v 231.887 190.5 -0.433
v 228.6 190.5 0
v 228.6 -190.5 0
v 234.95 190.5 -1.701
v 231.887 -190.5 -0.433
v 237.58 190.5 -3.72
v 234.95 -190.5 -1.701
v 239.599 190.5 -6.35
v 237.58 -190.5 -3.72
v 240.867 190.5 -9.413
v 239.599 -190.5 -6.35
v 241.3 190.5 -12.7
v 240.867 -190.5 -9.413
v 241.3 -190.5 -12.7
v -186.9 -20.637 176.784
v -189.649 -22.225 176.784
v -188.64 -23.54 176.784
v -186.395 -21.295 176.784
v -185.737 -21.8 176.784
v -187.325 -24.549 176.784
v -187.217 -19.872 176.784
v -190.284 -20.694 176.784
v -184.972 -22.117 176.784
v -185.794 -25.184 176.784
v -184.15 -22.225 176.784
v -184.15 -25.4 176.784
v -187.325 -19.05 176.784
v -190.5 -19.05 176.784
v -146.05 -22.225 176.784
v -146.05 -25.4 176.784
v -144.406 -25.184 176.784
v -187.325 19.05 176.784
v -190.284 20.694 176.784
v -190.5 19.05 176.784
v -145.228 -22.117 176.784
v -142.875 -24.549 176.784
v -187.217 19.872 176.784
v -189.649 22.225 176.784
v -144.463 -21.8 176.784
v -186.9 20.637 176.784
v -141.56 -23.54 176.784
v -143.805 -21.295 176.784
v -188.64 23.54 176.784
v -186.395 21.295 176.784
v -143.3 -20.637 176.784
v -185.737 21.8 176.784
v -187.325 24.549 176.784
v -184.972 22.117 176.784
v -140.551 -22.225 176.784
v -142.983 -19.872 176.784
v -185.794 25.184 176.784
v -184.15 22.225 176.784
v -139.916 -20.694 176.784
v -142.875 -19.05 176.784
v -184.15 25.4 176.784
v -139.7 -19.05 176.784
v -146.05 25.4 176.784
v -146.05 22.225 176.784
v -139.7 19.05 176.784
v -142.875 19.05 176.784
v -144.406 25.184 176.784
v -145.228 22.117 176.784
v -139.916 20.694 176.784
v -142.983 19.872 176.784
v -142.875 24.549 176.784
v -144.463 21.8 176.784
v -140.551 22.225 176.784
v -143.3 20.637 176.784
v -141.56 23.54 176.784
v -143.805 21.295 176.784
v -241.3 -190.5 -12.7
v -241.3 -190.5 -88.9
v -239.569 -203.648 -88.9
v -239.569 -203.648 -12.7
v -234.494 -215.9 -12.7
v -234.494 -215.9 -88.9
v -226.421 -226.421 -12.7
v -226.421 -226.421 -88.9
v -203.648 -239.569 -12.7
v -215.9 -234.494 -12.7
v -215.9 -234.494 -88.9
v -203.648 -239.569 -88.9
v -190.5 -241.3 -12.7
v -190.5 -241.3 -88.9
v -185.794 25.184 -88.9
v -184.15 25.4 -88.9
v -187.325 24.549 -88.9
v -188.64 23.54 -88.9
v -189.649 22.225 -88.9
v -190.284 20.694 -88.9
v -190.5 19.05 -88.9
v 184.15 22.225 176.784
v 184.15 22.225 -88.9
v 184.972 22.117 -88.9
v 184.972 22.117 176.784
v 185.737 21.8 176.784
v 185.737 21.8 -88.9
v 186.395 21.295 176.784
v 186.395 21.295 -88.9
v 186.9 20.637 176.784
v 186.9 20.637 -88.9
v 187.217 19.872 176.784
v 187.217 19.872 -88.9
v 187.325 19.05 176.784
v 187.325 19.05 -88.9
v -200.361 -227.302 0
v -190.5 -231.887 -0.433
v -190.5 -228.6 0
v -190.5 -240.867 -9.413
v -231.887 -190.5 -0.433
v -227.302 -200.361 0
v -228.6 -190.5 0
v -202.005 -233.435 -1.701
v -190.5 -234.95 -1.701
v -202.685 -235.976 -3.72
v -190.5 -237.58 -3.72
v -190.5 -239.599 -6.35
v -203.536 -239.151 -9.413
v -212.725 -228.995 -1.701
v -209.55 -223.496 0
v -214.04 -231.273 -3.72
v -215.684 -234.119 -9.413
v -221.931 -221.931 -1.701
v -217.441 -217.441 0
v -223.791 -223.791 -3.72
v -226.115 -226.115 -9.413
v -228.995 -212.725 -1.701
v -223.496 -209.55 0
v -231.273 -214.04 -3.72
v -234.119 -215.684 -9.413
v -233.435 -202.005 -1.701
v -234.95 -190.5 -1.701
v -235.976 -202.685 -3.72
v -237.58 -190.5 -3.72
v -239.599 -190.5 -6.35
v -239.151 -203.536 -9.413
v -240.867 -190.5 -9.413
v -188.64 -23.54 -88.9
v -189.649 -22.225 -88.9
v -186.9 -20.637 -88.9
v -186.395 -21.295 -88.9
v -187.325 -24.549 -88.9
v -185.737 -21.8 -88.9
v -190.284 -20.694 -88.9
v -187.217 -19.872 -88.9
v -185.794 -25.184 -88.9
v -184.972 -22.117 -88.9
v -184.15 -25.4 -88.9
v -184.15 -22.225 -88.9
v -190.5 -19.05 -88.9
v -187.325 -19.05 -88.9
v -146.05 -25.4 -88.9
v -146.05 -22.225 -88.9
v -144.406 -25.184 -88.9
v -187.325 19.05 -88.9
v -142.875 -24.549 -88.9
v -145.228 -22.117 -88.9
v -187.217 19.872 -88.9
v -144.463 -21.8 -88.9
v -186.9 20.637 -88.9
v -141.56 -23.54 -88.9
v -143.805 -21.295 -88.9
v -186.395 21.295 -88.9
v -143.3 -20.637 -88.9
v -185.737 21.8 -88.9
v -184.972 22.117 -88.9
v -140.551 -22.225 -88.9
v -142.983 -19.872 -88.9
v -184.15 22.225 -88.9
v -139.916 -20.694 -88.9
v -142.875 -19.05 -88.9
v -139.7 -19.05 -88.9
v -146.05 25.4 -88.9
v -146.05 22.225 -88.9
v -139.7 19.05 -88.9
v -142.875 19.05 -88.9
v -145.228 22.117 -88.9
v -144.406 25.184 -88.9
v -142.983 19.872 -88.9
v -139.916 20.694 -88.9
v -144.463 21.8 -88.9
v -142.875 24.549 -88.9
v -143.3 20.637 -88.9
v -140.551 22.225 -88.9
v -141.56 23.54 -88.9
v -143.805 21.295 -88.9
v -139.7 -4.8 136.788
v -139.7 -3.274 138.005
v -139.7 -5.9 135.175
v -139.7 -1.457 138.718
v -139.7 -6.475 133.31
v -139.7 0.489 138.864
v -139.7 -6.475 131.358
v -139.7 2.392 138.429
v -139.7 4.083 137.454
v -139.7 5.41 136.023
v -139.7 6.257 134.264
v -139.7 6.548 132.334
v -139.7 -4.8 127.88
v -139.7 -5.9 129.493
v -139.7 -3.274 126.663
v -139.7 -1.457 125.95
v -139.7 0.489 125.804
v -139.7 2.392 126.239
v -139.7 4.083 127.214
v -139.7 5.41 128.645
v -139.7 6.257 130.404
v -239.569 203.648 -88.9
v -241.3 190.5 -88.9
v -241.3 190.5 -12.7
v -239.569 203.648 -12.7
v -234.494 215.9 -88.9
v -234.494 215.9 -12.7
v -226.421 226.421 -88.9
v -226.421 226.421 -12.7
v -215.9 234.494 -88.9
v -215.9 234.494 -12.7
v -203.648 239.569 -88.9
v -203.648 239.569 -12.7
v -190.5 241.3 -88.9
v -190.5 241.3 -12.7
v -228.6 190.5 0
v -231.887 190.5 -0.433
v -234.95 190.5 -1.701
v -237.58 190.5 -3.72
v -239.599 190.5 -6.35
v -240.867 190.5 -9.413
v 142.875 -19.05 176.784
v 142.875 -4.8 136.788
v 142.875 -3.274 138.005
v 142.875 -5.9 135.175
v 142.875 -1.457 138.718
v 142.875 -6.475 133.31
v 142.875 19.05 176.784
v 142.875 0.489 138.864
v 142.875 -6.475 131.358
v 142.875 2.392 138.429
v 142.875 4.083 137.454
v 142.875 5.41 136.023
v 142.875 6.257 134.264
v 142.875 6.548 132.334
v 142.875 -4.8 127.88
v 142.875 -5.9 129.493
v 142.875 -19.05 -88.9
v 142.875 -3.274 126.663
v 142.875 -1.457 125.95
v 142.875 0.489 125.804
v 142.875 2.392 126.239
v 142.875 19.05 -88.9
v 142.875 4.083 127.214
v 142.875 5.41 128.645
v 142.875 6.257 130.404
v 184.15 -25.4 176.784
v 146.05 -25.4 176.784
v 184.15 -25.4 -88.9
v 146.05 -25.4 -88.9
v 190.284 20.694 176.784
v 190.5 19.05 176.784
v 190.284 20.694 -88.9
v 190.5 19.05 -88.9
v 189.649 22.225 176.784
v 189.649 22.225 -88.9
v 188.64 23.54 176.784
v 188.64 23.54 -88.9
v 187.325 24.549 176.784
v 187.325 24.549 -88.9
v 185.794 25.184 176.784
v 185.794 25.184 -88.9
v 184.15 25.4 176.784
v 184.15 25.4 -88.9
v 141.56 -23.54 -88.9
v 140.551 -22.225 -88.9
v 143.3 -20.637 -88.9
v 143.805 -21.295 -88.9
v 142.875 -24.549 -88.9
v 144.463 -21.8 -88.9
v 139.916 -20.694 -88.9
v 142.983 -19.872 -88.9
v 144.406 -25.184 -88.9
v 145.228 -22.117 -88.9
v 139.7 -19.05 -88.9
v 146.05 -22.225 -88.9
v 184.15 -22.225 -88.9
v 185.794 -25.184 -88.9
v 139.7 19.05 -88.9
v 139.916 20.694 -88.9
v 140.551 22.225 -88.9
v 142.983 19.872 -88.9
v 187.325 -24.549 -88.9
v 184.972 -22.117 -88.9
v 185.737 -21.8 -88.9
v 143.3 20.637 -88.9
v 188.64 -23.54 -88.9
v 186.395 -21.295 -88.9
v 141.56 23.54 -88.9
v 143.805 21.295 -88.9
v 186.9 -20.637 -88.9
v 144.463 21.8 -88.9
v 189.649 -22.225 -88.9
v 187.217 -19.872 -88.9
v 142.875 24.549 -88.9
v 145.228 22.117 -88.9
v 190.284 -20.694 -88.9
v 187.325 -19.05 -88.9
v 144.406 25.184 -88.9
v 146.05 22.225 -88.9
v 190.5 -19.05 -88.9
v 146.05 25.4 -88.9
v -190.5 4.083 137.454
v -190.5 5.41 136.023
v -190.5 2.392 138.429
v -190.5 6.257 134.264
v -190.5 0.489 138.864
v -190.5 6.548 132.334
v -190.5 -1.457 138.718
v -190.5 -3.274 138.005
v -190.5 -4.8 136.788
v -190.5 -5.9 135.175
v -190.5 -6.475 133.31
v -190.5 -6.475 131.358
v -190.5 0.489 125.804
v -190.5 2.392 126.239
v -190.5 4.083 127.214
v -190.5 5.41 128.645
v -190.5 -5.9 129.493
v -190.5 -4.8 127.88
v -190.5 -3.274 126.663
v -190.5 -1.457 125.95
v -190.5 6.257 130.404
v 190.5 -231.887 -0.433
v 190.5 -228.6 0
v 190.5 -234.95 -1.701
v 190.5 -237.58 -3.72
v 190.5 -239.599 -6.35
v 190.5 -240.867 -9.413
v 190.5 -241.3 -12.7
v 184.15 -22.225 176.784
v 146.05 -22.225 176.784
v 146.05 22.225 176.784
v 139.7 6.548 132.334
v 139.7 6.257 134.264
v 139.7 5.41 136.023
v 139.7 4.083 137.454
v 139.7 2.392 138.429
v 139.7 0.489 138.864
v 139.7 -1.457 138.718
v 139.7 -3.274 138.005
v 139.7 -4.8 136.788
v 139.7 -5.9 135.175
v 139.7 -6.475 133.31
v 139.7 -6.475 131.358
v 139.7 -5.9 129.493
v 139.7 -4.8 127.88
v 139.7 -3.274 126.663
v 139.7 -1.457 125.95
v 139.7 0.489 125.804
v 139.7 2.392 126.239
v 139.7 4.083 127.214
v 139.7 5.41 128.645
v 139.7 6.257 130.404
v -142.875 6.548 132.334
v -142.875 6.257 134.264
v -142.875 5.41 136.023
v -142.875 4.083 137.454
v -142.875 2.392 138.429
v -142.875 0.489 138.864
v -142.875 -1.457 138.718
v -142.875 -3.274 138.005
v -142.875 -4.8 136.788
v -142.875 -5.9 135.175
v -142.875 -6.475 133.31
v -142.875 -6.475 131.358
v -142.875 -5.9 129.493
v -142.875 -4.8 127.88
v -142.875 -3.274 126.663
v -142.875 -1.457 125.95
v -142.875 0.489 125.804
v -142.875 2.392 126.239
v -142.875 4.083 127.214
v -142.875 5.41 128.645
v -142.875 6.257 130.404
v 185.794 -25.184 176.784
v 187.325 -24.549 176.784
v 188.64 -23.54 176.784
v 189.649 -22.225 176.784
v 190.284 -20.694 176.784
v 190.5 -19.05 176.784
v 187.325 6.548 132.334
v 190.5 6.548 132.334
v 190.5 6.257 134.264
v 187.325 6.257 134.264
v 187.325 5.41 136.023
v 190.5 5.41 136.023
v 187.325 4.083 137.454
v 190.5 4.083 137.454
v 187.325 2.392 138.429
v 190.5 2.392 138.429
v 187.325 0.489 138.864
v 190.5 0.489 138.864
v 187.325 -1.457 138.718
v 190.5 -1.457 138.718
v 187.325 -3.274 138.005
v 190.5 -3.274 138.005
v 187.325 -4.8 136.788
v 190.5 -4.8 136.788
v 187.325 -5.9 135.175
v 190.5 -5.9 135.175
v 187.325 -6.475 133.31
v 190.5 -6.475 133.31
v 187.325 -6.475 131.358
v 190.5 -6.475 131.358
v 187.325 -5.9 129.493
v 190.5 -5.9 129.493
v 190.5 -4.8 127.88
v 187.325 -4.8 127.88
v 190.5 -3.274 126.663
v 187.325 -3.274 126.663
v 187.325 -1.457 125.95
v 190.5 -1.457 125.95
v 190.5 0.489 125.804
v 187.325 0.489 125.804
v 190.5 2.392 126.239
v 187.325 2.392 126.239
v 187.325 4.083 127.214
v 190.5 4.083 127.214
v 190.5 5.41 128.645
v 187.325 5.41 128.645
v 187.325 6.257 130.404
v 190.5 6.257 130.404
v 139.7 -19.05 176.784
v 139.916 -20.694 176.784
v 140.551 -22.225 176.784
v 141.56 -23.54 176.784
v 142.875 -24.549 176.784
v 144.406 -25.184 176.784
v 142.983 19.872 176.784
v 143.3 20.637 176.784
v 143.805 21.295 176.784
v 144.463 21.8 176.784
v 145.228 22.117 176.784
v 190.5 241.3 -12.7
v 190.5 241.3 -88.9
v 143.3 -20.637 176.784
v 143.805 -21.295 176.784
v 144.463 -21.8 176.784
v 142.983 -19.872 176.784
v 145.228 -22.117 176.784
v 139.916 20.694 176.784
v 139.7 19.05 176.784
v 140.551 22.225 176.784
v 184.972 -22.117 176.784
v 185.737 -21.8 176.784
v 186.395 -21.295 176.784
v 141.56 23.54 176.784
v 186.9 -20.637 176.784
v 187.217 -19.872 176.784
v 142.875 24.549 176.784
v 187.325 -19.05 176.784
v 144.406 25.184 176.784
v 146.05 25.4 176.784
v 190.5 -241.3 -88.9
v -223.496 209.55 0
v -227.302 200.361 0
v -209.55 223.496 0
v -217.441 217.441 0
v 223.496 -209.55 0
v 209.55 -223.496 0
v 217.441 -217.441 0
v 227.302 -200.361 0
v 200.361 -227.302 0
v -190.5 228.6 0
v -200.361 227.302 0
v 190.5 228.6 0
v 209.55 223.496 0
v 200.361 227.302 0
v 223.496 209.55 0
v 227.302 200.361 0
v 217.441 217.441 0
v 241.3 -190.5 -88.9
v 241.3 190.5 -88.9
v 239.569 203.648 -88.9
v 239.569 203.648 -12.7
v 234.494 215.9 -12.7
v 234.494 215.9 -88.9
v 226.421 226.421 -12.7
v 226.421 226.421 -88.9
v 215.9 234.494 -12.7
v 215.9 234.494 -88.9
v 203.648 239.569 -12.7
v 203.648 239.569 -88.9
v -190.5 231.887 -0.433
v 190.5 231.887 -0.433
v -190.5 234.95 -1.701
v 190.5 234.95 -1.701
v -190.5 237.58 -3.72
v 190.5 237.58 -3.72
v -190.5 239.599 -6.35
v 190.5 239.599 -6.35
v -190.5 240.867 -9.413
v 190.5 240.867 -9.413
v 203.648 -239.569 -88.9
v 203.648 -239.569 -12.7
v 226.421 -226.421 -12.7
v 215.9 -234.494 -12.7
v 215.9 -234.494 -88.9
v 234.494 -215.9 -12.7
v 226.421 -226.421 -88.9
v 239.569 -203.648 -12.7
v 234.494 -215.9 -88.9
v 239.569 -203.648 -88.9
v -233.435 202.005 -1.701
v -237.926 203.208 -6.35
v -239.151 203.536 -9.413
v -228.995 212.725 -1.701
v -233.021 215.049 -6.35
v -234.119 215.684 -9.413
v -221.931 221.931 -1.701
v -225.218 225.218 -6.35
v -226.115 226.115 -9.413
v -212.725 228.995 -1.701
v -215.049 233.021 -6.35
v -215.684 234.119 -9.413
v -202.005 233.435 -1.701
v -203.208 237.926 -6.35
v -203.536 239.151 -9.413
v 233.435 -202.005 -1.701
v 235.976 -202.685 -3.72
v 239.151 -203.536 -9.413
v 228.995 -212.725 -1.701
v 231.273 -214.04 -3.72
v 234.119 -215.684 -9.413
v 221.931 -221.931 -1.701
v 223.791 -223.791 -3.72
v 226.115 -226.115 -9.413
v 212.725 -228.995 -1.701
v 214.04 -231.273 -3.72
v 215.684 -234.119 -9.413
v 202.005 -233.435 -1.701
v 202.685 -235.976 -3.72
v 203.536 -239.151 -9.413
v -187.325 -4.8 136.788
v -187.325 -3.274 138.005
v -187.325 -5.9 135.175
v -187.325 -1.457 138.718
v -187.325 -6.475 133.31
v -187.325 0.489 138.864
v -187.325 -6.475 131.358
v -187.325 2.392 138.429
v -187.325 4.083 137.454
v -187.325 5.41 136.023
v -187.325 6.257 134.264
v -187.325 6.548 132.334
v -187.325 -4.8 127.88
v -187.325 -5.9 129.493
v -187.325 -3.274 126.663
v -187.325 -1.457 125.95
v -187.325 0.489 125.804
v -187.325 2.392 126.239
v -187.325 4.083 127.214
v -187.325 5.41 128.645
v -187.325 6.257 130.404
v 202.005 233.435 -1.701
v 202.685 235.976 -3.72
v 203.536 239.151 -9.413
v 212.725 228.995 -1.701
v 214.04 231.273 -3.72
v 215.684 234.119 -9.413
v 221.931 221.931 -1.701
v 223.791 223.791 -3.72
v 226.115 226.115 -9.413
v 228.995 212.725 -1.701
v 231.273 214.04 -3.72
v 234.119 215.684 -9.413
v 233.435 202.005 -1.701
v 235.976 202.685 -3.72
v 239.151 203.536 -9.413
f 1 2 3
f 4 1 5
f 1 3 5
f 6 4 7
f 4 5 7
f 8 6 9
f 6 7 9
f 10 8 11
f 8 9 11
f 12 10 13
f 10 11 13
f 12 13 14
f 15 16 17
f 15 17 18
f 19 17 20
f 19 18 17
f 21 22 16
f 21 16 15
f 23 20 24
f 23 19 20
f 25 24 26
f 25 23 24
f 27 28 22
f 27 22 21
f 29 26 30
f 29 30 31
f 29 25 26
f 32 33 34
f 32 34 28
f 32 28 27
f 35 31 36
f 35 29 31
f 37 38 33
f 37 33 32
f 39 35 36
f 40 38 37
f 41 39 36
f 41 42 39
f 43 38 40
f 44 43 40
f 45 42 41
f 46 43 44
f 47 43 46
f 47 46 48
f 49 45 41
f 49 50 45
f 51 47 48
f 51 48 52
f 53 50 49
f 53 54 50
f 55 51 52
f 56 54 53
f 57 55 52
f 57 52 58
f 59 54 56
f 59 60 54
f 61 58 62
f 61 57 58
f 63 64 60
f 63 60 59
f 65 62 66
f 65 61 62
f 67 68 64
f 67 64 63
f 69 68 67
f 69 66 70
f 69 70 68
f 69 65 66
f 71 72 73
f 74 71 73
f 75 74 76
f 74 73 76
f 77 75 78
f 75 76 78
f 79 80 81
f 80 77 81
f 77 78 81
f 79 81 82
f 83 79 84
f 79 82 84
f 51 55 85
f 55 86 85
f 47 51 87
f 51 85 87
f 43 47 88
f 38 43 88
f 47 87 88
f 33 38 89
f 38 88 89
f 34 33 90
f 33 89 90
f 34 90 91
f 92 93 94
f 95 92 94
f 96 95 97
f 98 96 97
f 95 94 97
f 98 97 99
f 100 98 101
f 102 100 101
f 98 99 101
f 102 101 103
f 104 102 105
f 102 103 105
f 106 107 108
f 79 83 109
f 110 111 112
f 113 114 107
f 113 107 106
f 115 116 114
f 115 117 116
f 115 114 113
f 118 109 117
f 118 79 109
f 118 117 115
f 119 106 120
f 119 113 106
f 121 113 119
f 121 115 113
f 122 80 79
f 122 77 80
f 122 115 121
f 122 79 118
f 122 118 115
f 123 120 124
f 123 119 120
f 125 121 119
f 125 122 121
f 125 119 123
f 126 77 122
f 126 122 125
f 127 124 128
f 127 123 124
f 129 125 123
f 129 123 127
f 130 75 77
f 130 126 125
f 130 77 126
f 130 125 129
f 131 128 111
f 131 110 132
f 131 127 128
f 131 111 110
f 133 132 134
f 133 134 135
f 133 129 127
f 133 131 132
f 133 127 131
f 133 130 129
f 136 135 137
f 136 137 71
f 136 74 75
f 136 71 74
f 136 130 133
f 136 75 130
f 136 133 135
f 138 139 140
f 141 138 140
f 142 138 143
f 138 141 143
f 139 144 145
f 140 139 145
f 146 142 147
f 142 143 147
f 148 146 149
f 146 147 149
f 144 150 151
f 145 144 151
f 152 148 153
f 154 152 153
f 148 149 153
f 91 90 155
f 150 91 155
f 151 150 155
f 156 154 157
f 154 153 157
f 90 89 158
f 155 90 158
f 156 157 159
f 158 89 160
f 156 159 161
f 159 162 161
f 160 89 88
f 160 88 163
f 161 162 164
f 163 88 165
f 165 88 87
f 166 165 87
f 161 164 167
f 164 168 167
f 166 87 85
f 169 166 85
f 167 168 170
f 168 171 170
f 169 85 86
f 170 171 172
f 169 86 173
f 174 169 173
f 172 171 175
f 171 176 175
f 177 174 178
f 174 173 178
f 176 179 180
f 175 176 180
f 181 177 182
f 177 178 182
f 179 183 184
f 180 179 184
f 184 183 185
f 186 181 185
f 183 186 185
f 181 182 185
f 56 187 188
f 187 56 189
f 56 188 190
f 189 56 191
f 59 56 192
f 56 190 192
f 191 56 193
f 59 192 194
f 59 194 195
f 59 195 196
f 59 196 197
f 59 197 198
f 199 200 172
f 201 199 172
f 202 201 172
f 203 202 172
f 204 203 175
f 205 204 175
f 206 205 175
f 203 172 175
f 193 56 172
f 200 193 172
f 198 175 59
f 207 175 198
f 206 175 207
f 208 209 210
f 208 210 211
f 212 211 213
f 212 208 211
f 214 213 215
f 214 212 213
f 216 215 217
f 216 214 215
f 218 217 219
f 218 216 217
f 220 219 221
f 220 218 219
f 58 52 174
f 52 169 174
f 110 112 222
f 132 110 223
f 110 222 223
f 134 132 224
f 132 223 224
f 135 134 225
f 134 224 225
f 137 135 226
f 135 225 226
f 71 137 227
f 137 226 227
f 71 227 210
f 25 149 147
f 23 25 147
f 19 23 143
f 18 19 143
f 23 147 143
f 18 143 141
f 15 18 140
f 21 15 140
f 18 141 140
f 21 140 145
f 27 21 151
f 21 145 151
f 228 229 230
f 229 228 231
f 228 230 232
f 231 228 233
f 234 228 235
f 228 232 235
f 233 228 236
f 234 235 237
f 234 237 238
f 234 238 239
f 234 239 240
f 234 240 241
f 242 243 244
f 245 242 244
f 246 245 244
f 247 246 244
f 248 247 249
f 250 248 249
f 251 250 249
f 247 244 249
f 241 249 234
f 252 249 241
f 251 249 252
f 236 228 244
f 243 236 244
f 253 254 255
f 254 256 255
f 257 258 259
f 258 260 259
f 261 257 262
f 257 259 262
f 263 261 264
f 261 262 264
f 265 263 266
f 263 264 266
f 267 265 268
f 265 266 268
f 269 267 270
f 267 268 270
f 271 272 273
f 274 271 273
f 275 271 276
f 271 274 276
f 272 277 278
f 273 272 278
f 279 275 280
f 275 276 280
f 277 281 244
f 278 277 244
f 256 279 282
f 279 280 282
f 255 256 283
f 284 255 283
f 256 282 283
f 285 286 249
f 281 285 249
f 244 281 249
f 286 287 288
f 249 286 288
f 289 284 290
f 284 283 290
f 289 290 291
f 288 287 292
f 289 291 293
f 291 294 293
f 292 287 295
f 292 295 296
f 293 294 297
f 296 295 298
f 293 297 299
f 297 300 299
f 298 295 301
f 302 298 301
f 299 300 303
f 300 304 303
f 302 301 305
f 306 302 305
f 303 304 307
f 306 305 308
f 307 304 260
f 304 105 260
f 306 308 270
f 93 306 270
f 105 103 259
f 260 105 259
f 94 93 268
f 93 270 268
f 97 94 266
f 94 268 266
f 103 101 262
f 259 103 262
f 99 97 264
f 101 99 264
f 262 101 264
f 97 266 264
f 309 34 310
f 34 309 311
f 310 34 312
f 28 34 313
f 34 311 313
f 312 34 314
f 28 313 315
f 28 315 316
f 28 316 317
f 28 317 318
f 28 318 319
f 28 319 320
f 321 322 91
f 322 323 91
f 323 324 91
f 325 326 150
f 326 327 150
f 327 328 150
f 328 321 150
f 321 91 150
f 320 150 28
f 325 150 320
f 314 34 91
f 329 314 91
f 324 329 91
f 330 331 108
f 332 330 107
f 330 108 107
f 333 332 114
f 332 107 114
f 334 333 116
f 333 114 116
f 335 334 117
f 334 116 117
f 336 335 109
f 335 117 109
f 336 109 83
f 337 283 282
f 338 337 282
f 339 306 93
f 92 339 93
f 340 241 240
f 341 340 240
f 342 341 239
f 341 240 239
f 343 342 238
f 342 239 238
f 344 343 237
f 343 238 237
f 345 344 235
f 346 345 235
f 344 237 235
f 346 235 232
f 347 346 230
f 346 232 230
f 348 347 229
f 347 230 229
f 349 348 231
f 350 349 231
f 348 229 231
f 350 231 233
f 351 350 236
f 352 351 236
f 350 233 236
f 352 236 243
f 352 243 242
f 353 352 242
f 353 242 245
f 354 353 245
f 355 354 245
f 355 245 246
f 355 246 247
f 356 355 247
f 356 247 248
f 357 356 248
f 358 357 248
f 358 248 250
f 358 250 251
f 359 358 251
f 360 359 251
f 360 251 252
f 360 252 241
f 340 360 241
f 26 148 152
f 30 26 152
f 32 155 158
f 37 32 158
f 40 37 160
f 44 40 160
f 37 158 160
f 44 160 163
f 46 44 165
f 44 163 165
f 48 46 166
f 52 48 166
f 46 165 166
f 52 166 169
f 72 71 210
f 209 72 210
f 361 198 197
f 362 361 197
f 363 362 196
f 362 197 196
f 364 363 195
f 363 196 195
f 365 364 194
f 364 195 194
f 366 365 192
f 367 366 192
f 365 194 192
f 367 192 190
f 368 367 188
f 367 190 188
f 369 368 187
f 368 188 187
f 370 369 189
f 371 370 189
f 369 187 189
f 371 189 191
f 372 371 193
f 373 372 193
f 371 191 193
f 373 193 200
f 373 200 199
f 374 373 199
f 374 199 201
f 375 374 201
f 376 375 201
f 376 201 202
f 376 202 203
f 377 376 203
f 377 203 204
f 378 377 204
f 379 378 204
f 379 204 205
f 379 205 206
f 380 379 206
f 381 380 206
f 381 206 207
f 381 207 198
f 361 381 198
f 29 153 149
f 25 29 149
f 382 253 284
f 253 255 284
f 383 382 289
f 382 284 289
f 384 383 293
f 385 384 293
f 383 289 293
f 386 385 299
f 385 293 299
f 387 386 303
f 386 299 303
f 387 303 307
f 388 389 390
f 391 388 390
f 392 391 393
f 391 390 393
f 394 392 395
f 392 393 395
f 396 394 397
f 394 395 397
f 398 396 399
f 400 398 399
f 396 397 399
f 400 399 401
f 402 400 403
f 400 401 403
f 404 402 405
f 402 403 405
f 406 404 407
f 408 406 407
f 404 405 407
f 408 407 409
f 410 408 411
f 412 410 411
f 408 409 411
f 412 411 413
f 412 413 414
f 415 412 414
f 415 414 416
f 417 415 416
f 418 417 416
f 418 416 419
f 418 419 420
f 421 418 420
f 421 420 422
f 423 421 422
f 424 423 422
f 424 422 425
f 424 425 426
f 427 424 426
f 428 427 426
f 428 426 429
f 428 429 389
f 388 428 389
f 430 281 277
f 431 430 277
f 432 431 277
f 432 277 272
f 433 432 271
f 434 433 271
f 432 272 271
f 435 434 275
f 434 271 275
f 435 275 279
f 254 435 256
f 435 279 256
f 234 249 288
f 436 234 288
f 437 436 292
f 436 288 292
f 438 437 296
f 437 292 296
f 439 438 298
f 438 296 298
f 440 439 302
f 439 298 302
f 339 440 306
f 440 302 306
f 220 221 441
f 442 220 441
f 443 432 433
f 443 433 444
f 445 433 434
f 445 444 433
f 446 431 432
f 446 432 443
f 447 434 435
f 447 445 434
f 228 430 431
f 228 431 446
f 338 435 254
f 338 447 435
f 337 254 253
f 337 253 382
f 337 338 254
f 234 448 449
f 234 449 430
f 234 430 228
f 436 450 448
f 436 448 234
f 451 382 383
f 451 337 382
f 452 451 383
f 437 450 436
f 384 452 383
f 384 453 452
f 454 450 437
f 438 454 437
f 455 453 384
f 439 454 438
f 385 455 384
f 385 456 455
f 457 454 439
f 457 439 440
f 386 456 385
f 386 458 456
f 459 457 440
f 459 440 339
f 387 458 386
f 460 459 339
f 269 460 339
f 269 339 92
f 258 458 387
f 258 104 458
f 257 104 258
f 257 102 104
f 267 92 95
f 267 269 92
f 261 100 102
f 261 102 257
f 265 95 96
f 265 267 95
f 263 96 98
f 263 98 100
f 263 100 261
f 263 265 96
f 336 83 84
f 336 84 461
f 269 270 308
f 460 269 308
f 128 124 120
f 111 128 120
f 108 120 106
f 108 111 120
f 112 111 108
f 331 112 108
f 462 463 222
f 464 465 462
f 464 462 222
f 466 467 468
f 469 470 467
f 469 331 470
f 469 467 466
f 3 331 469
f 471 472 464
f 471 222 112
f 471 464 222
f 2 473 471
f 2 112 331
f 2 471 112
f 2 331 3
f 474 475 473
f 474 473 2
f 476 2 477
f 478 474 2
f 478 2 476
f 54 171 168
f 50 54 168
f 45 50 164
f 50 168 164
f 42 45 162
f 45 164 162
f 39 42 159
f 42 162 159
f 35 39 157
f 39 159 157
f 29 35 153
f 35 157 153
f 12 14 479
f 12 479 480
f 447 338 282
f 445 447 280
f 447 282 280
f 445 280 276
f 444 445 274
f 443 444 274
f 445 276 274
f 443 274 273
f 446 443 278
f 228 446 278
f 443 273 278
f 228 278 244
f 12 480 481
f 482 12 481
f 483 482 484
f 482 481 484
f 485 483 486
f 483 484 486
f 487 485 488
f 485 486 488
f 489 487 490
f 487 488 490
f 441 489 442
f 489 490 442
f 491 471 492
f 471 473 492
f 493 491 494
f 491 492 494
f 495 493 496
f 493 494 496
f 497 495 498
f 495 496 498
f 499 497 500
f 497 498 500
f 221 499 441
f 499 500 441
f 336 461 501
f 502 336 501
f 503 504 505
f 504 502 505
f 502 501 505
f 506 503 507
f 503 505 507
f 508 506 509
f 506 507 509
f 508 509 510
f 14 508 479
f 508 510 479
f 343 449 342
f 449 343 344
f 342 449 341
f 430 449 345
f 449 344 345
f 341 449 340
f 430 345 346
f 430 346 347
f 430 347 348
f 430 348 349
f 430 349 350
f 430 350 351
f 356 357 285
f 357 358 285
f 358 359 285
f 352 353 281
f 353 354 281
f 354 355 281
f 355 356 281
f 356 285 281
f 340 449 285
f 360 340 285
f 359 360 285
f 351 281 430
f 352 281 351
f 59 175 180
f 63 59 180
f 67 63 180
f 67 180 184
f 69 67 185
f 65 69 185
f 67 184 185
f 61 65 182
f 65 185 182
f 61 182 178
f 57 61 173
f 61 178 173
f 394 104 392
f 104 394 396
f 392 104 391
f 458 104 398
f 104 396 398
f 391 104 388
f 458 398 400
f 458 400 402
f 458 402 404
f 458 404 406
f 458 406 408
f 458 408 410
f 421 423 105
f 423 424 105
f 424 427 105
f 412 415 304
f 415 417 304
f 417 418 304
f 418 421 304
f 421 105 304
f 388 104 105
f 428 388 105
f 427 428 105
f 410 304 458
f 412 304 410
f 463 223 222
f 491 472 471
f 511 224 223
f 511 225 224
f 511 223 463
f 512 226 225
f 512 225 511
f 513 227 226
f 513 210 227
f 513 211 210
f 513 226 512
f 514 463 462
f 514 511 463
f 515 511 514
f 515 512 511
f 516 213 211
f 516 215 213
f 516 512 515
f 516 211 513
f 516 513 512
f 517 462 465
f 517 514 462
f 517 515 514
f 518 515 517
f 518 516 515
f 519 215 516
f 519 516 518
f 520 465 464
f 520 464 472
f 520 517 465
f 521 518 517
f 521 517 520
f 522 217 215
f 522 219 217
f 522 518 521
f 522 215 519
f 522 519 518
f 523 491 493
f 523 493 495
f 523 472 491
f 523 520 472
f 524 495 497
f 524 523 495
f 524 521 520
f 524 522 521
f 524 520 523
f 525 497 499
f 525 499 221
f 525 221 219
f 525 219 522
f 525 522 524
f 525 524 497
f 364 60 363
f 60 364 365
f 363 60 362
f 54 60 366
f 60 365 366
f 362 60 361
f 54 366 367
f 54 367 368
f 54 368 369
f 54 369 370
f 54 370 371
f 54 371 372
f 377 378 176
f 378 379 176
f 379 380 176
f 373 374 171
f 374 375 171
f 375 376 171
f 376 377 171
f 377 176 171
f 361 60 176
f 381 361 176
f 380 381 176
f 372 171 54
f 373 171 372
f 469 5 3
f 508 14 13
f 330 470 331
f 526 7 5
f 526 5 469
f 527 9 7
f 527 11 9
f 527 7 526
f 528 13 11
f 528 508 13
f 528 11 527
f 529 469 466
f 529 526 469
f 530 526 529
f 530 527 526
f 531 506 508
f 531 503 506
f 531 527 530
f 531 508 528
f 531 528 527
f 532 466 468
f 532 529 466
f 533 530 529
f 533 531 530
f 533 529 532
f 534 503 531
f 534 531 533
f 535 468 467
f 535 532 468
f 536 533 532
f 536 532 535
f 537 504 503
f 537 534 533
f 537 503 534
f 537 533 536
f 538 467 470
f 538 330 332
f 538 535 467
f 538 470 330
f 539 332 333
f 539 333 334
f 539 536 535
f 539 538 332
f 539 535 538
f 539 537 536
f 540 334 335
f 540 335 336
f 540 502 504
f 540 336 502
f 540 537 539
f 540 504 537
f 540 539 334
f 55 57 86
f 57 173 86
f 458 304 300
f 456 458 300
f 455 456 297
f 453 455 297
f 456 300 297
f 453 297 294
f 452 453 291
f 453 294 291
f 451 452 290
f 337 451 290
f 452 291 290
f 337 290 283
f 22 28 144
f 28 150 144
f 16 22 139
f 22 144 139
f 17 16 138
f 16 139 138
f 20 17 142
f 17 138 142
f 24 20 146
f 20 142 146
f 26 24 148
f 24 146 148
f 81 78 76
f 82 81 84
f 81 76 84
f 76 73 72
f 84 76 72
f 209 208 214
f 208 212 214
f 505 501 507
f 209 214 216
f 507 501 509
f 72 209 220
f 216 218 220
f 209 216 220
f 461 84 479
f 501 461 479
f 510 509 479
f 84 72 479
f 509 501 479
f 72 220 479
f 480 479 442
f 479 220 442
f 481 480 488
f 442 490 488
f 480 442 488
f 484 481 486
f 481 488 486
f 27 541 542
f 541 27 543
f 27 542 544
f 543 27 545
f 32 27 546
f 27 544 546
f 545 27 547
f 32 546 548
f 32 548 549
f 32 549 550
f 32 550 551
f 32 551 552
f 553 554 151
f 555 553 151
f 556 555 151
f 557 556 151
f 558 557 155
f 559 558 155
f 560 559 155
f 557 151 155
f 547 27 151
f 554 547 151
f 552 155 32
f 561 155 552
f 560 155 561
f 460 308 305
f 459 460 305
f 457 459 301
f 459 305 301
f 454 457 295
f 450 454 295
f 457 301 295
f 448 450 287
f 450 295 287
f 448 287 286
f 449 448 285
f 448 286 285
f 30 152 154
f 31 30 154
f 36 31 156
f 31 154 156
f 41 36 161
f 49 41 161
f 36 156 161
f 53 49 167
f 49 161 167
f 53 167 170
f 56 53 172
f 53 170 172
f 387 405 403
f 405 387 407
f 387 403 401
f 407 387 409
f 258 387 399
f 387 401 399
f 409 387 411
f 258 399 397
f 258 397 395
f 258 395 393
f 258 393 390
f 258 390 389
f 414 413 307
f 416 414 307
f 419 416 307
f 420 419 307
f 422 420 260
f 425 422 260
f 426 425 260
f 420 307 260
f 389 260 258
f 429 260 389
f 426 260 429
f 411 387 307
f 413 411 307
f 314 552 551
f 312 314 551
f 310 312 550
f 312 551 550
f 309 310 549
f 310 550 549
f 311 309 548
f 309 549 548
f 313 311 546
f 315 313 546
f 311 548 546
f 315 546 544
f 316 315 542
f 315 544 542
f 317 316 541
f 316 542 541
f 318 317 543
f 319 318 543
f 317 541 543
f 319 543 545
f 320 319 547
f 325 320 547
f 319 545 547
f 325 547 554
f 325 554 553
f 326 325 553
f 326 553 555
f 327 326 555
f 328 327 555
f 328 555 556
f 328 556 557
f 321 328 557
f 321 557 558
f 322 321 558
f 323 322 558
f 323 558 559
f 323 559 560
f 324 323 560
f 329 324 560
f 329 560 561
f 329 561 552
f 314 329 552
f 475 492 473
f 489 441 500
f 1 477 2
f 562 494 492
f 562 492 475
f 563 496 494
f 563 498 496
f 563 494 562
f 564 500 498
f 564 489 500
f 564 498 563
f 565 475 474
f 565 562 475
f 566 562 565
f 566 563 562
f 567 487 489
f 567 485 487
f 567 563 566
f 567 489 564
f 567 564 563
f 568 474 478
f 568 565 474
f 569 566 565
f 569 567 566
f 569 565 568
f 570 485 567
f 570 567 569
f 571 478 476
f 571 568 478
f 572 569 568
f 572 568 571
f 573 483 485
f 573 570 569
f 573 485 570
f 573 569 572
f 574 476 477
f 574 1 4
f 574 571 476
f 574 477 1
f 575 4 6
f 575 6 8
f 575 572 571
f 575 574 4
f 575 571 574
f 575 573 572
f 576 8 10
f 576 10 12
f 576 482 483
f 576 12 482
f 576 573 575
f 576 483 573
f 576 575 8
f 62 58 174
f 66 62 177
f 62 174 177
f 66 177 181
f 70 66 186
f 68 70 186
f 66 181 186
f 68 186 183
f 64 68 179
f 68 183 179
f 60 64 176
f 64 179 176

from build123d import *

# Parameters (mm, degrees)
F0_W     = 482.6
F0_H     = 482.6
F1_DEPTH = 88.9
F2_R     = 50.8
F3_R     = 12.7
F5_DEPTH = 88.9
F7_DEPTH = 87.884
F8_R     = 6.54812
F9_DEPTH = 431.801


with BuildPart() as f1:
    # F0 (on Top) → F1 (new body)
    with BuildSketch(Plane.XY):
        Rectangle(F0_W, F0_H)
    extrude(amount=-F1_DEPTH)

    # F2
    f2_edges = [f1.edges().sort_by_distance(p)[0] for p in [
        (-241.3, -241.3, -44.45),
        (241.3, -241.3, -44.45),
        (241.3, 241.3, -44.45),
        (-241.3, 241.3, -44.45),
    ]]
    fillet(f2_edges, radius=F2_R)

    # F3
    f3_edges = [f1.edges().sort_by_distance(p)[0] for p in [
        (0, 241.3, 0),
    ]]
    fillet(f3_edges, radius=F3_R)


with BuildPart() as f5:
    # F4 (on Top) → F5 (new body, symmetric)
    with BuildSketch(Plane.XY):
        with BuildLine():
            ThreePointArc((190.5, 19.05), (188.640128, 23.540128), (184.15, 25.4))
            Line((184.15, 25.4), (146.05, 25.4))
            ThreePointArc((146.05, 25.4), (141.559872, 23.540128), (139.7, 19.05))
            Line((139.7, 19.05), (139.7, -19.05))
            ThreePointArc((139.7, -19.05), (141.559872, -23.540128), (146.05, -25.4))
            Line((146.05, -25.4), (184.15, -25.4))
            ThreePointArc((184.15, -25.4), (188.640128, -23.540128), (190.5, -19.05))
            Line((190.5, -19.05), (190.5, 19.05))
        make_face()
        with BuildLine():
            Line((146.05, 22.225), (184.15, 22.225))
            ThreePointArc((184.15, 22.225), (186.395064, 21.295064), (187.325, 19.05))
            Line((187.325, 19.05), (187.325, -19.05))
            ThreePointArc((187.325, -19.05), (186.395064, -21.295064), (184.15, -22.225))
            Line((184.15, -22.225), (146.05, -22.225))
            ThreePointArc((146.05, -22.225), (143.804936, -21.295064), (142.875, -19.05))
            Line((142.875, -19.05), (142.875, 19.05))
            ThreePointArc((142.875, 19.05), (143.804936, 21.295064), (146.05, 22.225))
        make_face(mode=Mode.SUBTRACT)
        with BuildLine():
            ThreePointArc((-139.7, 19.05), (-141.559872, 23.540128), (-146.05, 25.4))
            Line((-146.05, 25.4), (-184.15, 25.4))
            ThreePointArc((-184.15, 25.4), (-188.640128, 23.540128), (-190.5, 19.05))
            Line((-190.5, 19.05), (-190.5, -19.05))
            ThreePointArc((-190.5, -19.05), (-188.640128, -23.540128), (-184.15, -25.4))
            Line((-184.15, -25.4), (-146.05, -25.4))
            ThreePointArc((-146.05, -25.4), (-141.559872, -23.540128), (-139.7, -19.05))
            Line((-139.7, -19.05), (-139.7, 19.05))
        make_face()
        with BuildLine():
            Line((-184.15, 22.225), (-146.05, 22.225))
            ThreePointArc((-146.05, 22.225), (-143.804936, 21.295064), (-142.875, 19.05))
            Line((-142.875, 19.05), (-142.875, -19.05))
            ThreePointArc((-142.875, -19.05), (-143.804936, -21.295064), (-146.05, -22.225))
            Line((-146.05, -22.225), (-184.15, -22.225))
            ThreePointArc((-184.15, -22.225), (-186.395064, -21.295064), (-187.325, -19.05))
            Line((-187.325, -19.05), (-187.325, 19.05))
            ThreePointArc((-187.325, 19.05), (-186.395064, 21.295064), (-184.15, 22.225))
        make_face(mode=Mode.SUBTRACT)
    extrude(amount=F5_DEPTH, both=True)

    # F6 (on face) → F7 (join)
    with BuildSketch(Plane.XY.offset(88.9)):
        with BuildLine():
            ThreePointArc((139.7, -19.05), (141.559872, -23.540128), (146.05, -25.4))
            Line((146.05, -25.4), (184.15, -25.4))
            ThreePointArc((184.15, -25.4), (188.640128, -23.540128), (190.5, -19.05))
            Line((190.5, -19.05), (190.5, 19.05))
            ThreePointArc((190.5, 19.05), (188.640128, 23.540128), (184.15, 25.4))
            Line((184.15, 25.4), (146.05, 25.4))
            ThreePointArc((146.05, 25.4), (141.559872, 23.540128), (139.7, 19.05))
            Line((139.7, 19.05), (139.7, -19.05))
        make_face()
        with BuildLine():
            Line((142.875, -19.05), (142.875, 19.05))
            ThreePointArc((142.875, 19.05), (143.804936, 21.295064), (146.05, 22.225))
            Line((146.05, 22.225), (184.15, 22.225))
            ThreePointArc((184.15, 22.225), (186.395064, 21.295064), (187.325, 19.05))
            Line((187.325, 19.05), (187.325, -19.05))
            ThreePointArc((187.325, -19.05), (186.395064, -21.295064), (184.15, -22.225))
            Line((184.15, -22.225), (146.05, -22.225))
            ThreePointArc((146.05, -22.225), (143.804936, -21.295064), (142.875, -19.05))
        make_face(mode=Mode.SUBTRACT)
        with BuildLine():
            ThreePointArc((-139.7, 19.05), (-141.559872, 23.540128), (-146.05, 25.4))
            Line((-146.05, 25.4), (-184.15, 25.4))
            ThreePointArc((-184.15, 25.4), (-188.640128, 23.540128), (-190.5, 19.05))
            Line((-190.5, 19.05), (-190.5, -19.05))
            ThreePointArc((-190.5, -19.05), (-188.640128, -23.540128), (-184.15, -25.4))
            Line((-184.15, -25.4), (-146.05, -25.4))
            ThreePointArc((-146.05, -25.4), (-141.559872, -23.540128), (-139.7, -19.05))
            Line((-139.7, -19.05), (-139.7, 19.05))
        make_face()
        with BuildLine():
            Line((-184.15, 22.225), (-146.05, 22.225))
            ThreePointArc((-146.05, 22.225), (-143.804936, 21.295064), (-142.875, 19.05))
            Line((-142.875, 19.05), (-142.875, -19.05))
            ThreePointArc((-142.875, -19.05), (-143.804936, -21.295064), (-146.05, -22.225))
            Line((-146.05, -22.225), (-184.15, -22.225))
            ThreePointArc((-184.15, -22.225), (-186.395064, -21.295064), (-187.325, -19.05))
            Line((-187.325, -19.05), (-187.325, 19.05))
            ThreePointArc((-187.325, 19.05), (-186.395064, 21.295064), (-184.15, 22.225))
        make_face(mode=Mode.SUBTRACT)
    extrude(amount=F7_DEPTH)

    # F8 (on face) → F9 (cut, through all)
    with BuildSketch(Plane.YZ.offset(190.5)):
        with Locations((0, 132.334)):
            Circle(F8_R)
    extrude(amount=-F9_DEPTH, mode=Mode.SUBTRACT)


solid = Compound([f1.part, f5.part])
